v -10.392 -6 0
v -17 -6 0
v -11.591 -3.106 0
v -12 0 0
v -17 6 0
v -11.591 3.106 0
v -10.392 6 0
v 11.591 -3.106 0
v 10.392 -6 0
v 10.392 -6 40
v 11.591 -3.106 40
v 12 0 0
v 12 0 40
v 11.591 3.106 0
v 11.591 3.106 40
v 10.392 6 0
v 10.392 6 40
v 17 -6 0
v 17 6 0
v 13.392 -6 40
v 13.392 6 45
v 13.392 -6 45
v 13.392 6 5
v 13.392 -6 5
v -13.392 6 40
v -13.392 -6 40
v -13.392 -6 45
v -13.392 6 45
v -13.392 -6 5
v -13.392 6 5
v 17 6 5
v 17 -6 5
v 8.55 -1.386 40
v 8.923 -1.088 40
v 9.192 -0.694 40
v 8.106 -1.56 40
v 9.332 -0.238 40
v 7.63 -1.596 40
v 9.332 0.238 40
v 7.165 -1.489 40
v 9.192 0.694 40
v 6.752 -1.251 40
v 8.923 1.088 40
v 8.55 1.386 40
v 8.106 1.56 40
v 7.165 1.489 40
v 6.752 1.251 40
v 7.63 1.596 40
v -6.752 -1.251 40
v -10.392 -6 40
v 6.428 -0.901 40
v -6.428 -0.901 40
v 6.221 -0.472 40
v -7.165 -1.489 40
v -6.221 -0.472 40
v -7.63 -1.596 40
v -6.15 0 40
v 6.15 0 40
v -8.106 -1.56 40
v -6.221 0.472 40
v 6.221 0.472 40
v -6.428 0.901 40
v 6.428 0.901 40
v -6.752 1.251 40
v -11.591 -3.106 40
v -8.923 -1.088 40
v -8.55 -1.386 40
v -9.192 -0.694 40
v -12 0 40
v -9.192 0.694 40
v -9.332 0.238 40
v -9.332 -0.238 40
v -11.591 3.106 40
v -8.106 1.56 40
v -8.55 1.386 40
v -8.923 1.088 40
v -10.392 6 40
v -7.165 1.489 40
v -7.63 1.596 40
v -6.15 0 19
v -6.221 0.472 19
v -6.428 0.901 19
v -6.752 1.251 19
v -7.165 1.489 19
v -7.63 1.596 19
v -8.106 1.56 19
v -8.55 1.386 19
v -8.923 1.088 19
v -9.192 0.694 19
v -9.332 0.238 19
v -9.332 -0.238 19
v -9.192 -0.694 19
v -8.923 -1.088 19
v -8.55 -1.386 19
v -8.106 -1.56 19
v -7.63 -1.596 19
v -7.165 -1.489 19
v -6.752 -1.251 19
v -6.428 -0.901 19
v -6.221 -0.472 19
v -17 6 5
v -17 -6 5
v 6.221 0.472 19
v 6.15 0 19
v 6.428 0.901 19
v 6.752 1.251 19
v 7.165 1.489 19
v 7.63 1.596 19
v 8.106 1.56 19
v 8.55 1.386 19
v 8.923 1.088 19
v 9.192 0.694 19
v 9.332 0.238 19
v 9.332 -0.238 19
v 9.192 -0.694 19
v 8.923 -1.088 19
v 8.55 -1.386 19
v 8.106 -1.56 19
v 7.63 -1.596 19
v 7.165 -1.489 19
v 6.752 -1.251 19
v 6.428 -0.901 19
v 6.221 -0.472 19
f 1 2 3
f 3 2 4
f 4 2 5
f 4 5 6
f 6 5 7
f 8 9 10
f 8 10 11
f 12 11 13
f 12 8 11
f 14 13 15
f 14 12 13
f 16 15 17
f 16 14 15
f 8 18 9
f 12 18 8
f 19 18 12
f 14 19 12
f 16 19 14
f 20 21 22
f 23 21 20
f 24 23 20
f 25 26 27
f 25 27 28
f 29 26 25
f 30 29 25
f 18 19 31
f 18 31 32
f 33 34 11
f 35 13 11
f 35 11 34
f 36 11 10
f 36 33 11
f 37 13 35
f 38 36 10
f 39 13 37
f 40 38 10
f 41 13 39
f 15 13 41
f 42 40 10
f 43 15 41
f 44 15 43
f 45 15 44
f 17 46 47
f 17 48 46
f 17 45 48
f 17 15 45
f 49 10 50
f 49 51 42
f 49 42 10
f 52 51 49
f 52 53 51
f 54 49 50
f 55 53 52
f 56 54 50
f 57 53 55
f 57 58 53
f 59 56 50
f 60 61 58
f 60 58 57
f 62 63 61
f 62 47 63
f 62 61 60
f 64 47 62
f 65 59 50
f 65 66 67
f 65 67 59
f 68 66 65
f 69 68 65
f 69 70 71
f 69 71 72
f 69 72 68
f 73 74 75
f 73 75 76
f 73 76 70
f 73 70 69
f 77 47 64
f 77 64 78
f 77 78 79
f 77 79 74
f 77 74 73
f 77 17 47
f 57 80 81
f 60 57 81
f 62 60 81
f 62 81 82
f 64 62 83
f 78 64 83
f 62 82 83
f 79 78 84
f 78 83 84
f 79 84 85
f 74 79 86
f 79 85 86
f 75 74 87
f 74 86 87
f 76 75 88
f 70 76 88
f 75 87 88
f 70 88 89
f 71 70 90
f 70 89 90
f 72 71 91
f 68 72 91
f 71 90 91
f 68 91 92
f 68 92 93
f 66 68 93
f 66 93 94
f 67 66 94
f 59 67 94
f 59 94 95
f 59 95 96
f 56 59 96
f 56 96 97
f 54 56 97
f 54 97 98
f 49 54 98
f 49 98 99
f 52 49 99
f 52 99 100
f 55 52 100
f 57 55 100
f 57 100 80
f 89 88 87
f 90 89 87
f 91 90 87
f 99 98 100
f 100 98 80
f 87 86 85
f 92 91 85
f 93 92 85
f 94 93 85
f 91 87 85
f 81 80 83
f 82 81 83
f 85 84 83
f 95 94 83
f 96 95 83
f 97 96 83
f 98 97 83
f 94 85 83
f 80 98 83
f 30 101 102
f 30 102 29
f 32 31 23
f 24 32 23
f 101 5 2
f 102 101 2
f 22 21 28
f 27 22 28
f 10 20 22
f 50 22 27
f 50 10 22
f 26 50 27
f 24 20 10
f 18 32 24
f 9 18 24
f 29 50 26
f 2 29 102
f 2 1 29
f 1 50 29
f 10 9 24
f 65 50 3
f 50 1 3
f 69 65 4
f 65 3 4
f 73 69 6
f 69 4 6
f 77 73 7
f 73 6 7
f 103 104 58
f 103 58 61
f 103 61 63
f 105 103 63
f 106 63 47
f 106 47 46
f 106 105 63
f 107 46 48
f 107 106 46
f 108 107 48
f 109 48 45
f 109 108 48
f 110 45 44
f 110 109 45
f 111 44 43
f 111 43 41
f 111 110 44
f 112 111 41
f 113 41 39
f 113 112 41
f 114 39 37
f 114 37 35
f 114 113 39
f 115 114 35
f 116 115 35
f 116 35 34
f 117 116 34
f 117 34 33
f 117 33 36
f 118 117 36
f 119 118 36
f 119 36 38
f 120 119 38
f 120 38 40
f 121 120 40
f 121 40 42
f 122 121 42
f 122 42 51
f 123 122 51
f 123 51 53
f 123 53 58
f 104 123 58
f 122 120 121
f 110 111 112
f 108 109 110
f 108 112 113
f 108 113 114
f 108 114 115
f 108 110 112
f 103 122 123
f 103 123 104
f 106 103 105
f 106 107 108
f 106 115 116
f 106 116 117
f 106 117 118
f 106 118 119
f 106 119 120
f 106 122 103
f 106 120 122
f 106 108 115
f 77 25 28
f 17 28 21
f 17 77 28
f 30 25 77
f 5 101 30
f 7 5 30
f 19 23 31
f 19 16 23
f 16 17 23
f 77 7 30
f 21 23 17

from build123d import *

# Parameters (mm, degrees)
BOSS_EXTRU_2_DEPTH = 5
BOSS_EXTRU_3_DEPTH = 35
ESQUISSE7_W        = 13.392304845
ESQUISSE7_H        = 12
ESQUISSE7_R        = 1.6
BOSS_EXTRU_4_DEPTH = 5
BOSS_EXTRU_5_START = -26
ESQUISSE9_R        = 1.6
BOSS_EXTRU_5_DEPTH = 26


with BuildPart() as part:
    # Esquisse5 → Boss.-Extru.2 (new body)
    with BuildSketch(Plane.XY):
        with BuildLine():
            Line((-17, 6), (-17, -6))
            Line((-17, -6), (-10.392304845, -6))
            ThreePointArc((-10.392304845, -6), (-12, 0), (-10.392304845, 6))
            Line((-10.392304845, 6), (-17, 6))
        make_face()
    boss_extru_2 = extrude(amount=BOSS_EXTRU_2_DEPTH)

    # Esquisse6 → Boss.-Extru.3 (add)
    with BuildSketch(Plane.XY.offset(5)):
        with BuildLine():
            Line((-13.392304845, 6), (-13.392304845, -6))
            Line((-13.392304845, -6), (-10.392304845, -6))
            ThreePointArc((-10.392304845, -6), (-12, 0), (-10.392304845, 6))
            Line((-10.392304845, 6), (-13.392304845, 6))
        make_face()
    boss_extru_3 = extrude(amount=BOSS_EXTRU_3_DEPTH)

    # Esquisse7 → Boss.-Extru.4 (add)
    with BuildSketch(Plane.XY.offset(40)):
        with Locations((-6.696152422, 0)):
            Rectangle(ESQUISSE7_W, ESQUISSE7_H)
        with Locations((-7.75, 0)):
            Circle(ESQUISSE7_R, mode=Mode.SUBTRACT)
    boss_extru_4 = extrude(amount=BOSS_EXTRU_4_DEPTH)

    # Symétrie9: Boss.-Extru.4 across plane
    add(boss_extru_4.mirror(Plane(origin=(0, 0, 0), x_dir=(0, 0, 1), z_dir=(1, 0, 0))))

    # Symétrie10: Boss.-Extru.3 across plane
    add(boss_extru_3.mirror(Plane(origin=(0, 0, 0), x_dir=(0, 0, 1), z_dir=(1, 0, 0))))

    # Symétrie11: Boss.-Extru.2 across plane
    add(boss_extru_2.mirror(Plane(origin=(0, 0, 0), x_dir=(0, 0, 1), z_dir=(1, 0, 0))))

    # Esquisse9 → Boss.-Extru.5 (add)
    with BuildSketch(Plane.XY.offset(45).offset(BOSS_EXTRU_5_START)):
        with Locations((-7.75, 0)):
            Circle(ESQUISSE9_R)
    boss_extru_5 = extrude(amount=BOSS_EXTRU_5_DEPTH)

    # Symétrie12: Boss.-Extru.5 across plane
    add(boss_extru_5.mirror(Plane(origin=(0, 0, 0), x_dir=(0, 0, 1), z_dir=(1, 0, 0))))


solid = part.part
